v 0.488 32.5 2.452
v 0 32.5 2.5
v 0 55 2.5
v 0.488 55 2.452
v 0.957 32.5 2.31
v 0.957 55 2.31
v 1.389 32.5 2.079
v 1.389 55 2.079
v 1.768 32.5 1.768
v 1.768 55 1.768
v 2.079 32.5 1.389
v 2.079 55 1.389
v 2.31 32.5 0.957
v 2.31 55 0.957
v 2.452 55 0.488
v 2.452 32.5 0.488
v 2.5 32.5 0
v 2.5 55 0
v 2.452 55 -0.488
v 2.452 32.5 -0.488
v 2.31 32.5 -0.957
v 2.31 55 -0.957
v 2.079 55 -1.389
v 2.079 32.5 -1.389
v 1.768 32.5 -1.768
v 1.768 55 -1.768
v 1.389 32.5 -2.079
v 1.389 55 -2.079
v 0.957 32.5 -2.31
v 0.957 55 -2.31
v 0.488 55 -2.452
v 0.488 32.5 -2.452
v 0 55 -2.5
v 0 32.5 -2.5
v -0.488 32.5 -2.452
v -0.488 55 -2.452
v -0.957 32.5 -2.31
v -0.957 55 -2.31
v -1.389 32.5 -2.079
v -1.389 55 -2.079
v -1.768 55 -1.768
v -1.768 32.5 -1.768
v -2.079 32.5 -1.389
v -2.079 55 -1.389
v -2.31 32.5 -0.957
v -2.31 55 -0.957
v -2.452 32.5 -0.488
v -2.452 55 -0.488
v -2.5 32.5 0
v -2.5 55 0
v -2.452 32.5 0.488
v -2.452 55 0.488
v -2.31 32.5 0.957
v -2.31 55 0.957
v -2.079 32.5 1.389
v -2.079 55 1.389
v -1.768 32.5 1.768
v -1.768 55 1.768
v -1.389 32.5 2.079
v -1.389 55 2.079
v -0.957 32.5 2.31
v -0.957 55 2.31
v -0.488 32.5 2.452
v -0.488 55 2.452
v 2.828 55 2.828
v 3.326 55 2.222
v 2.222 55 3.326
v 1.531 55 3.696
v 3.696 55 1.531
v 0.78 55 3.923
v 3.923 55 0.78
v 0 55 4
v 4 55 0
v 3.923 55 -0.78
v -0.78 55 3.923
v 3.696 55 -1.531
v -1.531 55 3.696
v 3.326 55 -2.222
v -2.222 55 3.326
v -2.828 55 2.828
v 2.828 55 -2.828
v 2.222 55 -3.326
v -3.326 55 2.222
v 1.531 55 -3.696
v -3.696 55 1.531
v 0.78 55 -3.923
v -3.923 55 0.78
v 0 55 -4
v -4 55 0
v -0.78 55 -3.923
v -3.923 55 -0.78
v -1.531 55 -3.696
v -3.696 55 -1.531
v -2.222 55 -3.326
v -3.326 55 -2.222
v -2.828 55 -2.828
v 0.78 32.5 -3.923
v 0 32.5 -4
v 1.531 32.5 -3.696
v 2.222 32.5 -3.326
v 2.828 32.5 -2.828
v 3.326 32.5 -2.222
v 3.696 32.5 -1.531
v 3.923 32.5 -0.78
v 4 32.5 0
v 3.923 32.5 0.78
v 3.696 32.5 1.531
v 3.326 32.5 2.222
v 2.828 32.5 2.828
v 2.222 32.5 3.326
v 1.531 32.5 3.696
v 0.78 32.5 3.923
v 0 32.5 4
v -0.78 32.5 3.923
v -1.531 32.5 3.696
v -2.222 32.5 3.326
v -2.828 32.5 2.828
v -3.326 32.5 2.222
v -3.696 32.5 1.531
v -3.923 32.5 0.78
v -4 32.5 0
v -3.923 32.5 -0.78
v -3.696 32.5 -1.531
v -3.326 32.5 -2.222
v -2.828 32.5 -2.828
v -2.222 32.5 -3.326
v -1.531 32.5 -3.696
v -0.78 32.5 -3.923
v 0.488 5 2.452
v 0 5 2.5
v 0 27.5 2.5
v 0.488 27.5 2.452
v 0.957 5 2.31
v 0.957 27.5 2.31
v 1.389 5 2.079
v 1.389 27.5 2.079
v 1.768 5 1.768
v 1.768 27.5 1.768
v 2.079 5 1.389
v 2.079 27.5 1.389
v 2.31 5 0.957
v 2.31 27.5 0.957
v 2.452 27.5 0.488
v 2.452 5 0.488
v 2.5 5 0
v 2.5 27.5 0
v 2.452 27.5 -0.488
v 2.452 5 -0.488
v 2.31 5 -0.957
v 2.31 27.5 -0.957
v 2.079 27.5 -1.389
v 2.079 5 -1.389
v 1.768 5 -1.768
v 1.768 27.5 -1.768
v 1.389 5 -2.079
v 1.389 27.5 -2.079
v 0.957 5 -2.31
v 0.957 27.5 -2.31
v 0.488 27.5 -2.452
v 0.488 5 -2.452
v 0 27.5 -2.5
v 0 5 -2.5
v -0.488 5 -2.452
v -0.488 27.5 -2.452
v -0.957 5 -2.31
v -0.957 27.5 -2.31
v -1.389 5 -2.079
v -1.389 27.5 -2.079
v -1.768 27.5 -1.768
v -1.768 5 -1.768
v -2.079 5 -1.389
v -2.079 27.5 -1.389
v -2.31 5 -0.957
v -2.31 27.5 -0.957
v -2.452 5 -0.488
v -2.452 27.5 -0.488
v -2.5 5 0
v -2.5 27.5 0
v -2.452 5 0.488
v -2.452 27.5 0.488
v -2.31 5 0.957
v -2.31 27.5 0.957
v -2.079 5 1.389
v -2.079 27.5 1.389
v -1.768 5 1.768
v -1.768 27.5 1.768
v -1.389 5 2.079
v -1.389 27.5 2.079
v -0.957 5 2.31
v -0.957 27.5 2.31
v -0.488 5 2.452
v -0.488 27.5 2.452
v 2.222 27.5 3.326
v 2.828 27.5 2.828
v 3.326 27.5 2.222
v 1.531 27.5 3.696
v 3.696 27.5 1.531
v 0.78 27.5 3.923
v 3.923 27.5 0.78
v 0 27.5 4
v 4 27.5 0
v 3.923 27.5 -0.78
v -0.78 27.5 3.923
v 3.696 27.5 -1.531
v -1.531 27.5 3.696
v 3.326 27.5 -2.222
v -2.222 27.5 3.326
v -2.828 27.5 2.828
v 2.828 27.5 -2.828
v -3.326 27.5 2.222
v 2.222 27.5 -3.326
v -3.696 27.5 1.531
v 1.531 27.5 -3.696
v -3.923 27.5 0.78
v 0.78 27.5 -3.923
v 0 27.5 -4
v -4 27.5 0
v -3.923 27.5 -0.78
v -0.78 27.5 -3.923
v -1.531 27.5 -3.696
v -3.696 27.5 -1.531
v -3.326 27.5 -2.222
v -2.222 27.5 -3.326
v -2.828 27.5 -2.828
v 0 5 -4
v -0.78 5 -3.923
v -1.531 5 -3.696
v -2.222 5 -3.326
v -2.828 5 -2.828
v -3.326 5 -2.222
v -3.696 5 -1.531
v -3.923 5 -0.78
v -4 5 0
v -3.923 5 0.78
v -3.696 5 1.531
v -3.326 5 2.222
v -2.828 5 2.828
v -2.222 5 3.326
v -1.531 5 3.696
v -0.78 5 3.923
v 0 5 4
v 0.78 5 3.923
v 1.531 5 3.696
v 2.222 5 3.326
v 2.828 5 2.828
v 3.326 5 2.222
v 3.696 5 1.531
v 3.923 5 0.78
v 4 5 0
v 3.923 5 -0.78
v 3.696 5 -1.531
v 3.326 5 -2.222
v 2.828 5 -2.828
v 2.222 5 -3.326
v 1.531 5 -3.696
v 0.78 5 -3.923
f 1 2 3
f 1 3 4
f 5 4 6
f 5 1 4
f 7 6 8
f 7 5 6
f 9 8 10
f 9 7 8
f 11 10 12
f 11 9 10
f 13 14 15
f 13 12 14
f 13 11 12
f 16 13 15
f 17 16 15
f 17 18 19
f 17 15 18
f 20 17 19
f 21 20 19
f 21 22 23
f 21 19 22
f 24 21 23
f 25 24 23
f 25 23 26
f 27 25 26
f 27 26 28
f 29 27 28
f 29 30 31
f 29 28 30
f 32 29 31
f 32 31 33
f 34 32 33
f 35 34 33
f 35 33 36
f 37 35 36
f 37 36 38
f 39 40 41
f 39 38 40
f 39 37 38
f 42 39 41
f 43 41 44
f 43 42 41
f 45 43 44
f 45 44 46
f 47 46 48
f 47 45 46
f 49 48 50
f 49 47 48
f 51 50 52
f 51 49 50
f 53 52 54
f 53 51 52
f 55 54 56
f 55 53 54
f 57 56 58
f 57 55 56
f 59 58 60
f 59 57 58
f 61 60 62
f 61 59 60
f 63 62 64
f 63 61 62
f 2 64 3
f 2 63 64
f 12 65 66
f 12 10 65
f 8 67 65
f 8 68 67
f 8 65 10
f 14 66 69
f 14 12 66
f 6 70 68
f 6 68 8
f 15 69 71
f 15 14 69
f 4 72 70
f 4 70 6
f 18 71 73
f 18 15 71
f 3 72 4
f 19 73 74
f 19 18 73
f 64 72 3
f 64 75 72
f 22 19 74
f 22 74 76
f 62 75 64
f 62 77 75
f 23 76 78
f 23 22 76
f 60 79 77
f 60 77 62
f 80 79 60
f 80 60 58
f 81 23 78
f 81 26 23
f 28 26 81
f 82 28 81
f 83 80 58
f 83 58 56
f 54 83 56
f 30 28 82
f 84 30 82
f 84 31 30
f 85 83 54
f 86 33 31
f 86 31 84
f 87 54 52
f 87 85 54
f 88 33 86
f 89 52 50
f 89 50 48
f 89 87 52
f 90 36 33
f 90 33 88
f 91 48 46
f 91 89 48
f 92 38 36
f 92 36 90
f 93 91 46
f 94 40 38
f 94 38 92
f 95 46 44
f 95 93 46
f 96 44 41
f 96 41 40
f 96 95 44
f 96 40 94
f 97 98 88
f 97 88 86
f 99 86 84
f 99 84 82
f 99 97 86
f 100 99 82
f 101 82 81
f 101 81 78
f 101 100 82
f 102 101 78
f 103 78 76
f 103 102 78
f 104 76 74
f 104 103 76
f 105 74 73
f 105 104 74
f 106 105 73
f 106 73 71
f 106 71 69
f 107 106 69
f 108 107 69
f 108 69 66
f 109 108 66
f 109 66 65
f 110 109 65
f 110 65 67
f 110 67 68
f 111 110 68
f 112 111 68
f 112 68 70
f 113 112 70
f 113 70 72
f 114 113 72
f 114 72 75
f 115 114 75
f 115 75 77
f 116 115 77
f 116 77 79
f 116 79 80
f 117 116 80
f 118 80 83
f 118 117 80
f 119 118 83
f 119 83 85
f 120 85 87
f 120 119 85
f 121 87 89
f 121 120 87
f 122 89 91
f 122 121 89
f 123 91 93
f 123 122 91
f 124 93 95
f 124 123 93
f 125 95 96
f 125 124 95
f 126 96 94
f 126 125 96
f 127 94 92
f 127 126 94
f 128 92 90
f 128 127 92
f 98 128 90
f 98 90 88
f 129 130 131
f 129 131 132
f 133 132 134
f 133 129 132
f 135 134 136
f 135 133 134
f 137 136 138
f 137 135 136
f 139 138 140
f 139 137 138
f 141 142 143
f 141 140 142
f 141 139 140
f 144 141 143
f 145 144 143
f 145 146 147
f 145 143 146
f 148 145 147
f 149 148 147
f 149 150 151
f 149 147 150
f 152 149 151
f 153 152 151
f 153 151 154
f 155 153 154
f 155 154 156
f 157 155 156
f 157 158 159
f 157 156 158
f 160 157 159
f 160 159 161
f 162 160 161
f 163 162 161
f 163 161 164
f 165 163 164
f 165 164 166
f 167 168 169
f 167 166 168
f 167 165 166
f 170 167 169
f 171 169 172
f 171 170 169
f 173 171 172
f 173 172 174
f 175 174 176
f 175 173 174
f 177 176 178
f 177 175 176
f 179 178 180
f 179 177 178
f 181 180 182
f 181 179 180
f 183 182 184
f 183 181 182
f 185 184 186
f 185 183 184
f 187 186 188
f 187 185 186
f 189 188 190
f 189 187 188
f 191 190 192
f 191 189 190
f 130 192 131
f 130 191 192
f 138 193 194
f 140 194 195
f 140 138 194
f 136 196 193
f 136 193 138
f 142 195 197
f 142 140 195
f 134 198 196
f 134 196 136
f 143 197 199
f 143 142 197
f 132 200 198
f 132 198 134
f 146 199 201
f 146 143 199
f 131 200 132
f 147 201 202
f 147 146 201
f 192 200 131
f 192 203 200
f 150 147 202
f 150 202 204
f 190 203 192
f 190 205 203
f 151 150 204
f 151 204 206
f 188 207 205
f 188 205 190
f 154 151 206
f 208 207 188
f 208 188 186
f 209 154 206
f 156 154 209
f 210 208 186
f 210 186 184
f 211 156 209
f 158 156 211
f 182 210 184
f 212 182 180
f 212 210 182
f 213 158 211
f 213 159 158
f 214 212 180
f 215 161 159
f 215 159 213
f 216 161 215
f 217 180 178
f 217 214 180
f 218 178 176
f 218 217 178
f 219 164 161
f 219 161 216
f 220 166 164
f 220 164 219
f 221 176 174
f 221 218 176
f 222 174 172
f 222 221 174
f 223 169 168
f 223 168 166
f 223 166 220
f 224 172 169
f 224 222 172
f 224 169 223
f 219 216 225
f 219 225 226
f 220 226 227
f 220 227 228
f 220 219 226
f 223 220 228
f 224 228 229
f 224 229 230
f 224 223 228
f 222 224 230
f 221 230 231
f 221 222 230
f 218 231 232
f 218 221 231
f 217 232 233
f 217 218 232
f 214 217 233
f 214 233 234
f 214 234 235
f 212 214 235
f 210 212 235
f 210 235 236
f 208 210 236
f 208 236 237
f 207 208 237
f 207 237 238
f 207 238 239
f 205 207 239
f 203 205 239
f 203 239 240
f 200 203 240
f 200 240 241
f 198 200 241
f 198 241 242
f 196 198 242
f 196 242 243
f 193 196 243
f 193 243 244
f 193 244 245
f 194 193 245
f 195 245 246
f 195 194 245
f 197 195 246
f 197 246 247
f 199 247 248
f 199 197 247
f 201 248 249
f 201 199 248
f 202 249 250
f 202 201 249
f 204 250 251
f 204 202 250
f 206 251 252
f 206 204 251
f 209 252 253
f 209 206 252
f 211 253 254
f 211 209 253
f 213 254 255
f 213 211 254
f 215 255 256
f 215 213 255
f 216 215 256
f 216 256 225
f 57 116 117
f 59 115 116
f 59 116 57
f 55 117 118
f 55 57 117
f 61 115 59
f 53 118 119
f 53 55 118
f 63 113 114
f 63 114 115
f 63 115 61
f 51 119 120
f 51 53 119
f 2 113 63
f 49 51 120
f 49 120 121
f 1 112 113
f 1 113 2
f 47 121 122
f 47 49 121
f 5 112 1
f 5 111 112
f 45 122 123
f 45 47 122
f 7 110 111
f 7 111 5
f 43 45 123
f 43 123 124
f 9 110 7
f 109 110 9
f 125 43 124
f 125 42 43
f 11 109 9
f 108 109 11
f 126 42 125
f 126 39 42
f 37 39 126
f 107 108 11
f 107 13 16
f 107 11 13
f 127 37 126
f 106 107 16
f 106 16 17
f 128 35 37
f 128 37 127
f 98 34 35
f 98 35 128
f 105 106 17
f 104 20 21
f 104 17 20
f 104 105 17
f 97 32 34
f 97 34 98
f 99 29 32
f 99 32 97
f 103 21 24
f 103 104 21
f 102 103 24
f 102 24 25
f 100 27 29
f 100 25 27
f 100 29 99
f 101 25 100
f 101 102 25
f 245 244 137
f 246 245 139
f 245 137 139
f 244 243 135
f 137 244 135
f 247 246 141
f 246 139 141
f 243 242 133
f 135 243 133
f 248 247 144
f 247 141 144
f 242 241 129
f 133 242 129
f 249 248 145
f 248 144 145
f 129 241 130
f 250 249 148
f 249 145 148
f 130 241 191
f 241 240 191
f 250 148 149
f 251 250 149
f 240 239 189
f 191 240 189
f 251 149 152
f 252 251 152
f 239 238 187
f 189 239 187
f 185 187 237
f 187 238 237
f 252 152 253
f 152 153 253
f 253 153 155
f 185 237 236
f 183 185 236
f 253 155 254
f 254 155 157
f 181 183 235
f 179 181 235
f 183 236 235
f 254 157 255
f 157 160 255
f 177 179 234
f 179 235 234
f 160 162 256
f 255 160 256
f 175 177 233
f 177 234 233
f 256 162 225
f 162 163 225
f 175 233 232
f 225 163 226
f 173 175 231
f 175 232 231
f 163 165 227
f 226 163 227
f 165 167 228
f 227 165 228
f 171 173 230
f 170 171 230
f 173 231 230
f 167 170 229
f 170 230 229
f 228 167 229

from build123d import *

# Parameters (mm, degrees)
SKETCH2_R               = 2.5
BOSS_EXTRUDE1_DEPTH     = 60
CUT_EXTRUDE1_DEPTH      = 61.104076401
CUT_EXTRUDE1_DEPTH_BACK = 61.104076401
SKETCH4_W               = 16.005108063
SKETCH4_H               = 5
SKETCH5_R               = 4
BOSS_EXTRUDE2_DEPTH     = 27.5
SKETCH6_R               = 4
BOSS_EXTRUDE3_DEPTH     = 27.5
CUT_EXTRUDE2_DEPTH      = 61.266076693
CUT_EXTRUDE2_DEPTH_BACK = 61.266076693
SKETCH7_R               = 2.5
CUT_EXTRUDE3_DEPTH      = 61.266076693
CUT_EXTRUDE3_DEPTH_BACK = 61.266076693
SKETCH8_W               = 8
SKETCH8_H               = 5


with BuildPart() as part:
    # Sketch2 → Boss-Extrude1 (new body)
    with BuildSketch(Plane(origin=(0, 0, 0), x_dir=(1, 0, 0), z_dir=(0, 1, 0))):
        with Locations(Location((0, 0, 0), (0, 0, 270))):
            Circle(SKETCH2_R)
    extrude(amount=BOSS_EXTRUDE1_DEPTH)

    # Sketch4 → Cut-Extrude1 (cut, two sides: drawn at the far end of the back side and taken through both)
    with BuildSketch(Plane(origin=(0, 0, 0), x_dir=(0, 0, -1), z_dir=(1, 0, 0)).offset(-CUT_EXTRUDE1_DEPTH_BACK)):
        with Locations((-1.726998302, 30)):
            Rectangle(SKETCH4_W, SKETCH4_H)
    extrude(amount=CUT_EXTRUDE1_DEPTH + CUT_EXTRUDE1_DEPTH_BACK, mode=Mode.SUBTRACT)


with BuildPart() as cut_extrude1_piece_1:
    # of the separate pieces the step leaves, piece 1, a body of its own (cut_extrude1_pieces)
    add(part.part.solids().sort_by_distance((0, 0, 2.5))[0])

    # Sketch6 → Boss-Extrude3 (add, through all)
    with BuildSketch(Plane(origin=(0, 27.5, 0), x_dir=(1, 0, 0), z_dir=(0, 1, 0))):
        with Locations(Location((0, 0, 0), (0, 0, 90))):
            Circle(SKETCH6_R)
    extrude(amount=-BOSS_EXTRUDE3_DEPTH)


with BuildPart() as cut_extrude1_piece_2:
    # of the separate pieces the step leaves, piece 2, a body of its own (cut_extrude1_pieces)
    add(part.part.solids().sort_by_distance((0, 32.5, 2.5))[0])

    # Sketch5 → Boss-Extrude2 (add, through all)
    with BuildSketch(Plane.XZ.offset(-32.5)):
        with Locations(Location((0, 0, 0), (0, 0, 270))):
            Circle(SKETCH5_R)
    extrude(amount=-BOSS_EXTRUDE2_DEPTH)


with BuildPart() as cut_extrude2_tool:
    # Sketch7 → Cut-Extrude2 (new, two sides: drawn at the far end of the back side and taken through both)
    with BuildSketch(Plane(origin=(0, 60, 0), x_dir=(1, 0, 0), z_dir=(0, 1, 0)).offset(-CUT_EXTRUDE2_DEPTH_BACK)):
        with Locations(Location((0, 0, 0), (0, 0, 270))):
            Circle(SKETCH7_R)
    extrude(amount=CUT_EXTRUDE2_DEPTH + CUT_EXTRUDE2_DEPTH_BACK)


with BuildPart() as cut_extrude1_piece_1_1:
    add(cut_extrude1_piece_1.part)

    # Cut-Extrude2: cut by cut_extrude2_tool
    add(cut_extrude2_tool.part, mode=Mode.SUBTRACT)


with BuildPart() as cut_extrude1_piece_2_1:
    add(cut_extrude1_piece_2.part)

    # Cut-Extrude2: cut by cut_extrude2_tool
    add(cut_extrude2_tool.part, mode=Mode.SUBTRACT)


with BuildPart() as cut_extrude3_tool:
    # Sketch8 → Cut-Extrude3 (new, two sides: drawn at the far end of the back side and taken through both)
    with BuildSketch(Plane(origin=(0, 0, 0), x_dir=(0, 0, -1), z_dir=(1, 0, 0)).offset(-CUT_EXTRUDE3_DEPTH_BACK)):
        with Locations((0, 57.5)):
            Rectangle(SKETCH8_W, SKETCH8_H)
        with Locations((0, 2.5)):
            Rectangle(SKETCH8_W, SKETCH8_H)
    extrude(amount=CUT_EXTRUDE3_DEPTH + CUT_EXTRUDE3_DEPTH_BACK)


with BuildPart() as cut_extrude1_piece_1_2:
    add(cut_extrude1_piece_1_1.part)

    # Cut-Extrude3: cut by cut_extrude3_tool
    add(cut_extrude3_tool.part, mode=Mode.SUBTRACT)


with BuildPart() as cut_extrude1_piece_2_2:
    add(cut_extrude1_piece_2_1.part)

    # Cut-Extrude3: cut by cut_extrude3_tool
    add(cut_extrude3_tool.part, mode=Mode.SUBTRACT)


solid = Compound([cut_extrude1_piece_1_2.part, cut_extrude1_piece_2_2.part])
